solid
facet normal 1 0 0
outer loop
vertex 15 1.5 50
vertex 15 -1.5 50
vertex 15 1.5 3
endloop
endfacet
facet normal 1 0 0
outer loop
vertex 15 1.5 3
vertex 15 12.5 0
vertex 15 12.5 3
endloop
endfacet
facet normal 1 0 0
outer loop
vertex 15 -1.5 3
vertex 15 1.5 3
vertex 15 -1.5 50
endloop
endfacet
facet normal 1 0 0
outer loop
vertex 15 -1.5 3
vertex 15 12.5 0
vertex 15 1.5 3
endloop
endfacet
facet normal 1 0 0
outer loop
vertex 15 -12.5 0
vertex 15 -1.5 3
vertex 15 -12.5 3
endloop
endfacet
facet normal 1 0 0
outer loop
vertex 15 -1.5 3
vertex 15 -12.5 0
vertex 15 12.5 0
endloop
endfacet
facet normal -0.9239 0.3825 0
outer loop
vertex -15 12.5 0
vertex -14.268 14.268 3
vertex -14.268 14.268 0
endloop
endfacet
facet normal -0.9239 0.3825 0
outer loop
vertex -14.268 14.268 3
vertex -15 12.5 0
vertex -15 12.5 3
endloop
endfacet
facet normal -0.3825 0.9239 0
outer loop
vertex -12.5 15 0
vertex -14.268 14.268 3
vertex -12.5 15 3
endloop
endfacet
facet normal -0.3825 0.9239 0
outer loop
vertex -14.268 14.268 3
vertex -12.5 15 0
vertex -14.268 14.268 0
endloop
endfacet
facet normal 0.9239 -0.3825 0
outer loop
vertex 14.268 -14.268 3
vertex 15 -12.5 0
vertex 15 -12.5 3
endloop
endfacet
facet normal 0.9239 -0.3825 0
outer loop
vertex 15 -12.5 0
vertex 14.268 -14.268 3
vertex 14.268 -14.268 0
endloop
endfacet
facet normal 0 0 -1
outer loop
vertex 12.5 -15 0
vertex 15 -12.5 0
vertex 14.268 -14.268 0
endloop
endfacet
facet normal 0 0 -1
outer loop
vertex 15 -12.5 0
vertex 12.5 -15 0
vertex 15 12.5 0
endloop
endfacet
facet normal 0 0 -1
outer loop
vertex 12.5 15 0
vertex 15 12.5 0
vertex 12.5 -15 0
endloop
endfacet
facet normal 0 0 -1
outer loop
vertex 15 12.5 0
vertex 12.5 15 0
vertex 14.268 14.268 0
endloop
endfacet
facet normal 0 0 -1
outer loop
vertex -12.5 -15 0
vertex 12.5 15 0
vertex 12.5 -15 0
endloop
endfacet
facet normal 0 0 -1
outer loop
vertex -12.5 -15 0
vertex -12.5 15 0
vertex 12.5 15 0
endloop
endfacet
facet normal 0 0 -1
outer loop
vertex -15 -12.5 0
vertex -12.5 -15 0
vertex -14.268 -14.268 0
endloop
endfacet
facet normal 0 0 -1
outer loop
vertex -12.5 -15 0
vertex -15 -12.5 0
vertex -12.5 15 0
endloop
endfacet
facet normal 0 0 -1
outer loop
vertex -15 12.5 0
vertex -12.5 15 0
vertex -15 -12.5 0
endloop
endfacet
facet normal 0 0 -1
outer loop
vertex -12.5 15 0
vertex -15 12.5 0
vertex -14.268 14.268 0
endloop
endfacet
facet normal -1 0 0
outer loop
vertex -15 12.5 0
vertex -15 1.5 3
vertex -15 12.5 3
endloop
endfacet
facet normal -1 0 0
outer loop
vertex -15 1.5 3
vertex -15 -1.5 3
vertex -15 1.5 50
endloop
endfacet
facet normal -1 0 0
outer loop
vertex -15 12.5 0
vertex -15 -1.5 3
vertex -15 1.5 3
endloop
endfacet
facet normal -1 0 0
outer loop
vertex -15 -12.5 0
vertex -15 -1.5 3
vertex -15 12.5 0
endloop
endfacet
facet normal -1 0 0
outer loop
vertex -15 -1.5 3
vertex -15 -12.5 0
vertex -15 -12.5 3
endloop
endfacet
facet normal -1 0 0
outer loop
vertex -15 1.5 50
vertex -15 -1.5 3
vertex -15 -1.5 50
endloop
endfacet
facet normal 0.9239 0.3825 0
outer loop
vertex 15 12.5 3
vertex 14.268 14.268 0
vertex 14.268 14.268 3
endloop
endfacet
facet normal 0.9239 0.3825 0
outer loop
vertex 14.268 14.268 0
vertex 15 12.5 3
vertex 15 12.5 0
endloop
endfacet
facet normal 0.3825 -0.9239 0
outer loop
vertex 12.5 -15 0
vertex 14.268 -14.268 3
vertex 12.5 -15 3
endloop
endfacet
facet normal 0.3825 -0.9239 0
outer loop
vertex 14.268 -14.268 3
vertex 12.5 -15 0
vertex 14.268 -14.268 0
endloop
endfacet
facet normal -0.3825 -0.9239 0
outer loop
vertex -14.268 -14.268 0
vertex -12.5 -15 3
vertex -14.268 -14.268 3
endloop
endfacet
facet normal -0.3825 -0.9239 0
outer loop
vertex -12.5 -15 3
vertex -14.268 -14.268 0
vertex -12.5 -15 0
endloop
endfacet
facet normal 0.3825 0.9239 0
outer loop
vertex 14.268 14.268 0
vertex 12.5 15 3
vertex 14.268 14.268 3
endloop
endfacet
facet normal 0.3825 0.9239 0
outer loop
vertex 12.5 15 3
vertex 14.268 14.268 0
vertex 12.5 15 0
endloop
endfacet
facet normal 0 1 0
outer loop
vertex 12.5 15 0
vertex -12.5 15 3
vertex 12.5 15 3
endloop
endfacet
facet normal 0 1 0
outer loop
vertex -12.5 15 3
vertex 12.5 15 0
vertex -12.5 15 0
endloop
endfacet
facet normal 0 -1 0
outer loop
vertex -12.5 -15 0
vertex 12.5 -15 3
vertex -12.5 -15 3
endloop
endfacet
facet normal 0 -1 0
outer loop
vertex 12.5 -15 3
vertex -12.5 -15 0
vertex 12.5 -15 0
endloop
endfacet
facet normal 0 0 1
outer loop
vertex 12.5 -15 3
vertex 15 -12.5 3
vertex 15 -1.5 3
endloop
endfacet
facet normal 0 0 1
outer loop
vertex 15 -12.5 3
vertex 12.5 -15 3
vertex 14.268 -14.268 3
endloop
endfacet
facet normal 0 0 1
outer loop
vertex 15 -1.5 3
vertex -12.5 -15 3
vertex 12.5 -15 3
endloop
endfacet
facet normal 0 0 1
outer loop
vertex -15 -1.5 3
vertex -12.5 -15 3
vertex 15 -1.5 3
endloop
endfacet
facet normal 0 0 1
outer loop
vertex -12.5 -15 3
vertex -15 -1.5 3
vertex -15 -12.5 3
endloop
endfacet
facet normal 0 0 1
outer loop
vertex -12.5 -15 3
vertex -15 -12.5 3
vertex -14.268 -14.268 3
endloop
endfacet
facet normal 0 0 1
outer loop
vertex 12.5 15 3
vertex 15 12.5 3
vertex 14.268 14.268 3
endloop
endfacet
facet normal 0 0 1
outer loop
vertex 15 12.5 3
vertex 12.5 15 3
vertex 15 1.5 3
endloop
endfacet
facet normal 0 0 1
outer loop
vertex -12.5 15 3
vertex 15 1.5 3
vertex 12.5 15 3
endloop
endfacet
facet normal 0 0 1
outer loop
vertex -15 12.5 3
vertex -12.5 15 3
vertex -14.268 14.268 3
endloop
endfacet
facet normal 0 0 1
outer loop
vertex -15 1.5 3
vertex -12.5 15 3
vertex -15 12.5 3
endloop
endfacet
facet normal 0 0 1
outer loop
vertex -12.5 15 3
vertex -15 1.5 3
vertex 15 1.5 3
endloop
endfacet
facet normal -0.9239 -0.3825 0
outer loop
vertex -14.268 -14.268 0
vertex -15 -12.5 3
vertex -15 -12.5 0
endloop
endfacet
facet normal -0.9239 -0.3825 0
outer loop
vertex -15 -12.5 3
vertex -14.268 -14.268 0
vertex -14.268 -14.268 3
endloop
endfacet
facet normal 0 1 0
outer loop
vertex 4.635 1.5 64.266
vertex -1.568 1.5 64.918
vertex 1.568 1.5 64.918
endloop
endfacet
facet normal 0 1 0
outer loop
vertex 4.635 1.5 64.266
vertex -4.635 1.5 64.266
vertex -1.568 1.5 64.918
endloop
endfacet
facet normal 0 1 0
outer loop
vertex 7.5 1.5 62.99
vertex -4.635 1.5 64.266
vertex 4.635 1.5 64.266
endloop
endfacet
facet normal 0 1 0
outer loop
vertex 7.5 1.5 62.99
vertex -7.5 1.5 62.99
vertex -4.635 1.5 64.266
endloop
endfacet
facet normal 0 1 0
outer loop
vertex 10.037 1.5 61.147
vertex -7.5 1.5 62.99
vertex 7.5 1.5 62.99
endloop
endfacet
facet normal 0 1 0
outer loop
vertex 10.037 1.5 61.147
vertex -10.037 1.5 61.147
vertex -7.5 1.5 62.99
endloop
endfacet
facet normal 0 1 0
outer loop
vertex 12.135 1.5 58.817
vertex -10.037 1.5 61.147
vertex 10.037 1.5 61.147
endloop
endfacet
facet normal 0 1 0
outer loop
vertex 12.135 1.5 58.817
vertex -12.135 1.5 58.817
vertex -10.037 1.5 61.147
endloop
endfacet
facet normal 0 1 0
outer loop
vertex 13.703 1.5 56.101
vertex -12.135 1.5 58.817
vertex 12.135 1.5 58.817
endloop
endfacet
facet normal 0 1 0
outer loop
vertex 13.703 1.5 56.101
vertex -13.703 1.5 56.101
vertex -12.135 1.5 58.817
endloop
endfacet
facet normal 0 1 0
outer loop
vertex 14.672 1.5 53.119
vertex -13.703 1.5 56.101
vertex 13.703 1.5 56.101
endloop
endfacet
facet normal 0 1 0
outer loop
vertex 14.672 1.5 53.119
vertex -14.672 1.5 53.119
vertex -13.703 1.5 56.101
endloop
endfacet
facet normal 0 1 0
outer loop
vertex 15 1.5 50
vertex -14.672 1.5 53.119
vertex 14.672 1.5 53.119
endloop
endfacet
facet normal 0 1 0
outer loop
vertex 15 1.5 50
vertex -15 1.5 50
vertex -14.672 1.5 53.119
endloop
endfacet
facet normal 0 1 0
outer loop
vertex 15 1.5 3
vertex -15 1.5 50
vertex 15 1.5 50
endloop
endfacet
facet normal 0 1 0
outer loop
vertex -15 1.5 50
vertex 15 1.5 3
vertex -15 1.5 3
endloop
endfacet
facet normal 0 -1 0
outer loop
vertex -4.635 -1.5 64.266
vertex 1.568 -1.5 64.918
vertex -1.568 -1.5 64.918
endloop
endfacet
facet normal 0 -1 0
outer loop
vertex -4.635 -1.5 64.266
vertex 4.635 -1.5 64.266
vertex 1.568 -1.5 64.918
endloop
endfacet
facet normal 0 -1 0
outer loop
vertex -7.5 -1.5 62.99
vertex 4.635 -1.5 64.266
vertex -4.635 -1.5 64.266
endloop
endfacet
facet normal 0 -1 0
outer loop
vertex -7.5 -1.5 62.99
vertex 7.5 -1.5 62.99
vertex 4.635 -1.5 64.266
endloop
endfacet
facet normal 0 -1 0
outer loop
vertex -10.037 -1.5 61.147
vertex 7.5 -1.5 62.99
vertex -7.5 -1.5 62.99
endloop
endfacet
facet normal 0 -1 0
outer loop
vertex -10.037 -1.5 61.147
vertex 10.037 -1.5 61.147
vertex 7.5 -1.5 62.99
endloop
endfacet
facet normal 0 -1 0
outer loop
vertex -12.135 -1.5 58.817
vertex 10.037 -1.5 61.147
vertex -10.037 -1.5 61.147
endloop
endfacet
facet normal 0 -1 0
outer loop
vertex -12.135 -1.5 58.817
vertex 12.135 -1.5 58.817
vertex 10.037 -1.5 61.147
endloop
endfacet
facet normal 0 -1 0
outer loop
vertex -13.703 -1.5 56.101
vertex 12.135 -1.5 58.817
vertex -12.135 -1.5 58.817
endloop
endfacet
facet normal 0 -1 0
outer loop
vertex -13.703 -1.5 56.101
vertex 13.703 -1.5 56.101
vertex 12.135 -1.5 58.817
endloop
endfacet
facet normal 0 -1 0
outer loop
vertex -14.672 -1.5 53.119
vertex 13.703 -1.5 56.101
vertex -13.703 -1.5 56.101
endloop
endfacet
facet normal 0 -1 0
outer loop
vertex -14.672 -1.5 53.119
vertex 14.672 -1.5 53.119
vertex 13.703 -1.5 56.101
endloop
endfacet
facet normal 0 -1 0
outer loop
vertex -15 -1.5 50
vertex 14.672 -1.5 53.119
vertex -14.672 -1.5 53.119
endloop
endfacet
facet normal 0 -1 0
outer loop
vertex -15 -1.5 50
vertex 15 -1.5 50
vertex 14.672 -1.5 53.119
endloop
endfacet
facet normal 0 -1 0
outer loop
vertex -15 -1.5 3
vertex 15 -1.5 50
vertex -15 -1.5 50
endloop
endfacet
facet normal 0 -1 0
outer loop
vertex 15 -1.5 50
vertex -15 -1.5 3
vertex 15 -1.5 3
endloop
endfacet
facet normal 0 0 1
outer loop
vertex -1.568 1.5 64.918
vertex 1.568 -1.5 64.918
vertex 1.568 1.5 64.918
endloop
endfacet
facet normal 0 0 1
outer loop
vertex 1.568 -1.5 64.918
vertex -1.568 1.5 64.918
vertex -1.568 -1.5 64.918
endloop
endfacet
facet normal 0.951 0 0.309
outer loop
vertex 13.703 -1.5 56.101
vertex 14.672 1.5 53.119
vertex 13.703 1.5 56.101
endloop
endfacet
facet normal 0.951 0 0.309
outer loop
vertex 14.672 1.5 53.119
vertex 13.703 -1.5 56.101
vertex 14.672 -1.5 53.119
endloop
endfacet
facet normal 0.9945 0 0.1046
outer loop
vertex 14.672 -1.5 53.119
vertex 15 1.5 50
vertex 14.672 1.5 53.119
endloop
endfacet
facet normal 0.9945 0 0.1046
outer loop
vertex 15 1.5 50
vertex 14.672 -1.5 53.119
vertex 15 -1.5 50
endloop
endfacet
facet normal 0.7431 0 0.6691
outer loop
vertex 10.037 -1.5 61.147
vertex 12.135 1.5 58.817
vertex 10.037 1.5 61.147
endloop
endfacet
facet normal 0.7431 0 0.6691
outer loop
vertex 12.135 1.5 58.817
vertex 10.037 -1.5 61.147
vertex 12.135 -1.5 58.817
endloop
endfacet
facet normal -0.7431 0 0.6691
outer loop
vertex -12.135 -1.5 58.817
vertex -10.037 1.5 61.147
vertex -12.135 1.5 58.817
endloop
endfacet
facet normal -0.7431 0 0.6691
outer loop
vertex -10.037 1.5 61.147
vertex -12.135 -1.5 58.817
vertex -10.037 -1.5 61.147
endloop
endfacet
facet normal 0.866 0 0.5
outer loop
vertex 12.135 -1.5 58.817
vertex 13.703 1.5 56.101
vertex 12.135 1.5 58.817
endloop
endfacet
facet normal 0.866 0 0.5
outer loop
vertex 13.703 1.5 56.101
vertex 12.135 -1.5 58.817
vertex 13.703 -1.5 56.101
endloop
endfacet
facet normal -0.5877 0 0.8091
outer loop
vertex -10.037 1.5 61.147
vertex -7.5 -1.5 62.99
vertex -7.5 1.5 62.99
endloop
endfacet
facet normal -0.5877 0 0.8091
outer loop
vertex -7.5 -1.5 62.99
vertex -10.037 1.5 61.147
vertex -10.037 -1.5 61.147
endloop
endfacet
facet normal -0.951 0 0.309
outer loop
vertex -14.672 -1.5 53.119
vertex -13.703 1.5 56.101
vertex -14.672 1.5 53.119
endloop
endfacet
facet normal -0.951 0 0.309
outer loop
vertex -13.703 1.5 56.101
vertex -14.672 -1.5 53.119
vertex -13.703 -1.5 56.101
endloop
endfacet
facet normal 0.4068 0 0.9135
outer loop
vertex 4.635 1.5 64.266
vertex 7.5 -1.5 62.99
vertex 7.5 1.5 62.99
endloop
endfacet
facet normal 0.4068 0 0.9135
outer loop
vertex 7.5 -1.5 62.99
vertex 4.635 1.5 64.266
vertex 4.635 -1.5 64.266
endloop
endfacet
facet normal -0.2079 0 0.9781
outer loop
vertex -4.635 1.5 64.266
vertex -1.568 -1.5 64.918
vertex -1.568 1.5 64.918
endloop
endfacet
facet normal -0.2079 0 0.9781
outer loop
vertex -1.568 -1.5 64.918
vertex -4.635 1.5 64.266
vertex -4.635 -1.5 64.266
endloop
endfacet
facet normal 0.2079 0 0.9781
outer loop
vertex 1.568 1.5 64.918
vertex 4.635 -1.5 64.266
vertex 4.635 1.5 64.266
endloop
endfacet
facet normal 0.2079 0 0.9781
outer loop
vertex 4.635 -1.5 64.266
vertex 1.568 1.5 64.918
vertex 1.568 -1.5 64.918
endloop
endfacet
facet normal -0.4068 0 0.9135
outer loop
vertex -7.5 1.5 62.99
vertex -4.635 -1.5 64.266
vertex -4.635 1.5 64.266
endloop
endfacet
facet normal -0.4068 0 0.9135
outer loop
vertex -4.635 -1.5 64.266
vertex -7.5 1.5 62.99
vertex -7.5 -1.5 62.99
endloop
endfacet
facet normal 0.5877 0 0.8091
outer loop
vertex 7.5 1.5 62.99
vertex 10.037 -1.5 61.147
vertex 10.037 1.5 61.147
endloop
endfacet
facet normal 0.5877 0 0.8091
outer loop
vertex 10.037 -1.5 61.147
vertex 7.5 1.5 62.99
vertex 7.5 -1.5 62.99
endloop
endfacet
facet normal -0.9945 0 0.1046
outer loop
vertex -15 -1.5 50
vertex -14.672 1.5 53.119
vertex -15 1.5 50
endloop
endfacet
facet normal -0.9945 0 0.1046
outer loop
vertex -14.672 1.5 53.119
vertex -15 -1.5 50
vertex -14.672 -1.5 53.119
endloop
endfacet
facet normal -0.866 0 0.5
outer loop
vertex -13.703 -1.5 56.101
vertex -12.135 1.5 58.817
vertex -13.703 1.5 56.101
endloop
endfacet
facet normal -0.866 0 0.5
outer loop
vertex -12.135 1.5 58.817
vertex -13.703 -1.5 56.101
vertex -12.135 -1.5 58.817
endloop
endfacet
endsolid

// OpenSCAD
D = 5;
B = 25;


linear_extrude(3)minkowski() {
    circle(d=D);
    square([B,B], center=true);
}

translate([0,0,2*B/2])cube([B+D, 3, 2*B], center=true);
translate([0,0,2*B])rotate([90,0,0])cylinder(d=B+D, h=3, center=true);
